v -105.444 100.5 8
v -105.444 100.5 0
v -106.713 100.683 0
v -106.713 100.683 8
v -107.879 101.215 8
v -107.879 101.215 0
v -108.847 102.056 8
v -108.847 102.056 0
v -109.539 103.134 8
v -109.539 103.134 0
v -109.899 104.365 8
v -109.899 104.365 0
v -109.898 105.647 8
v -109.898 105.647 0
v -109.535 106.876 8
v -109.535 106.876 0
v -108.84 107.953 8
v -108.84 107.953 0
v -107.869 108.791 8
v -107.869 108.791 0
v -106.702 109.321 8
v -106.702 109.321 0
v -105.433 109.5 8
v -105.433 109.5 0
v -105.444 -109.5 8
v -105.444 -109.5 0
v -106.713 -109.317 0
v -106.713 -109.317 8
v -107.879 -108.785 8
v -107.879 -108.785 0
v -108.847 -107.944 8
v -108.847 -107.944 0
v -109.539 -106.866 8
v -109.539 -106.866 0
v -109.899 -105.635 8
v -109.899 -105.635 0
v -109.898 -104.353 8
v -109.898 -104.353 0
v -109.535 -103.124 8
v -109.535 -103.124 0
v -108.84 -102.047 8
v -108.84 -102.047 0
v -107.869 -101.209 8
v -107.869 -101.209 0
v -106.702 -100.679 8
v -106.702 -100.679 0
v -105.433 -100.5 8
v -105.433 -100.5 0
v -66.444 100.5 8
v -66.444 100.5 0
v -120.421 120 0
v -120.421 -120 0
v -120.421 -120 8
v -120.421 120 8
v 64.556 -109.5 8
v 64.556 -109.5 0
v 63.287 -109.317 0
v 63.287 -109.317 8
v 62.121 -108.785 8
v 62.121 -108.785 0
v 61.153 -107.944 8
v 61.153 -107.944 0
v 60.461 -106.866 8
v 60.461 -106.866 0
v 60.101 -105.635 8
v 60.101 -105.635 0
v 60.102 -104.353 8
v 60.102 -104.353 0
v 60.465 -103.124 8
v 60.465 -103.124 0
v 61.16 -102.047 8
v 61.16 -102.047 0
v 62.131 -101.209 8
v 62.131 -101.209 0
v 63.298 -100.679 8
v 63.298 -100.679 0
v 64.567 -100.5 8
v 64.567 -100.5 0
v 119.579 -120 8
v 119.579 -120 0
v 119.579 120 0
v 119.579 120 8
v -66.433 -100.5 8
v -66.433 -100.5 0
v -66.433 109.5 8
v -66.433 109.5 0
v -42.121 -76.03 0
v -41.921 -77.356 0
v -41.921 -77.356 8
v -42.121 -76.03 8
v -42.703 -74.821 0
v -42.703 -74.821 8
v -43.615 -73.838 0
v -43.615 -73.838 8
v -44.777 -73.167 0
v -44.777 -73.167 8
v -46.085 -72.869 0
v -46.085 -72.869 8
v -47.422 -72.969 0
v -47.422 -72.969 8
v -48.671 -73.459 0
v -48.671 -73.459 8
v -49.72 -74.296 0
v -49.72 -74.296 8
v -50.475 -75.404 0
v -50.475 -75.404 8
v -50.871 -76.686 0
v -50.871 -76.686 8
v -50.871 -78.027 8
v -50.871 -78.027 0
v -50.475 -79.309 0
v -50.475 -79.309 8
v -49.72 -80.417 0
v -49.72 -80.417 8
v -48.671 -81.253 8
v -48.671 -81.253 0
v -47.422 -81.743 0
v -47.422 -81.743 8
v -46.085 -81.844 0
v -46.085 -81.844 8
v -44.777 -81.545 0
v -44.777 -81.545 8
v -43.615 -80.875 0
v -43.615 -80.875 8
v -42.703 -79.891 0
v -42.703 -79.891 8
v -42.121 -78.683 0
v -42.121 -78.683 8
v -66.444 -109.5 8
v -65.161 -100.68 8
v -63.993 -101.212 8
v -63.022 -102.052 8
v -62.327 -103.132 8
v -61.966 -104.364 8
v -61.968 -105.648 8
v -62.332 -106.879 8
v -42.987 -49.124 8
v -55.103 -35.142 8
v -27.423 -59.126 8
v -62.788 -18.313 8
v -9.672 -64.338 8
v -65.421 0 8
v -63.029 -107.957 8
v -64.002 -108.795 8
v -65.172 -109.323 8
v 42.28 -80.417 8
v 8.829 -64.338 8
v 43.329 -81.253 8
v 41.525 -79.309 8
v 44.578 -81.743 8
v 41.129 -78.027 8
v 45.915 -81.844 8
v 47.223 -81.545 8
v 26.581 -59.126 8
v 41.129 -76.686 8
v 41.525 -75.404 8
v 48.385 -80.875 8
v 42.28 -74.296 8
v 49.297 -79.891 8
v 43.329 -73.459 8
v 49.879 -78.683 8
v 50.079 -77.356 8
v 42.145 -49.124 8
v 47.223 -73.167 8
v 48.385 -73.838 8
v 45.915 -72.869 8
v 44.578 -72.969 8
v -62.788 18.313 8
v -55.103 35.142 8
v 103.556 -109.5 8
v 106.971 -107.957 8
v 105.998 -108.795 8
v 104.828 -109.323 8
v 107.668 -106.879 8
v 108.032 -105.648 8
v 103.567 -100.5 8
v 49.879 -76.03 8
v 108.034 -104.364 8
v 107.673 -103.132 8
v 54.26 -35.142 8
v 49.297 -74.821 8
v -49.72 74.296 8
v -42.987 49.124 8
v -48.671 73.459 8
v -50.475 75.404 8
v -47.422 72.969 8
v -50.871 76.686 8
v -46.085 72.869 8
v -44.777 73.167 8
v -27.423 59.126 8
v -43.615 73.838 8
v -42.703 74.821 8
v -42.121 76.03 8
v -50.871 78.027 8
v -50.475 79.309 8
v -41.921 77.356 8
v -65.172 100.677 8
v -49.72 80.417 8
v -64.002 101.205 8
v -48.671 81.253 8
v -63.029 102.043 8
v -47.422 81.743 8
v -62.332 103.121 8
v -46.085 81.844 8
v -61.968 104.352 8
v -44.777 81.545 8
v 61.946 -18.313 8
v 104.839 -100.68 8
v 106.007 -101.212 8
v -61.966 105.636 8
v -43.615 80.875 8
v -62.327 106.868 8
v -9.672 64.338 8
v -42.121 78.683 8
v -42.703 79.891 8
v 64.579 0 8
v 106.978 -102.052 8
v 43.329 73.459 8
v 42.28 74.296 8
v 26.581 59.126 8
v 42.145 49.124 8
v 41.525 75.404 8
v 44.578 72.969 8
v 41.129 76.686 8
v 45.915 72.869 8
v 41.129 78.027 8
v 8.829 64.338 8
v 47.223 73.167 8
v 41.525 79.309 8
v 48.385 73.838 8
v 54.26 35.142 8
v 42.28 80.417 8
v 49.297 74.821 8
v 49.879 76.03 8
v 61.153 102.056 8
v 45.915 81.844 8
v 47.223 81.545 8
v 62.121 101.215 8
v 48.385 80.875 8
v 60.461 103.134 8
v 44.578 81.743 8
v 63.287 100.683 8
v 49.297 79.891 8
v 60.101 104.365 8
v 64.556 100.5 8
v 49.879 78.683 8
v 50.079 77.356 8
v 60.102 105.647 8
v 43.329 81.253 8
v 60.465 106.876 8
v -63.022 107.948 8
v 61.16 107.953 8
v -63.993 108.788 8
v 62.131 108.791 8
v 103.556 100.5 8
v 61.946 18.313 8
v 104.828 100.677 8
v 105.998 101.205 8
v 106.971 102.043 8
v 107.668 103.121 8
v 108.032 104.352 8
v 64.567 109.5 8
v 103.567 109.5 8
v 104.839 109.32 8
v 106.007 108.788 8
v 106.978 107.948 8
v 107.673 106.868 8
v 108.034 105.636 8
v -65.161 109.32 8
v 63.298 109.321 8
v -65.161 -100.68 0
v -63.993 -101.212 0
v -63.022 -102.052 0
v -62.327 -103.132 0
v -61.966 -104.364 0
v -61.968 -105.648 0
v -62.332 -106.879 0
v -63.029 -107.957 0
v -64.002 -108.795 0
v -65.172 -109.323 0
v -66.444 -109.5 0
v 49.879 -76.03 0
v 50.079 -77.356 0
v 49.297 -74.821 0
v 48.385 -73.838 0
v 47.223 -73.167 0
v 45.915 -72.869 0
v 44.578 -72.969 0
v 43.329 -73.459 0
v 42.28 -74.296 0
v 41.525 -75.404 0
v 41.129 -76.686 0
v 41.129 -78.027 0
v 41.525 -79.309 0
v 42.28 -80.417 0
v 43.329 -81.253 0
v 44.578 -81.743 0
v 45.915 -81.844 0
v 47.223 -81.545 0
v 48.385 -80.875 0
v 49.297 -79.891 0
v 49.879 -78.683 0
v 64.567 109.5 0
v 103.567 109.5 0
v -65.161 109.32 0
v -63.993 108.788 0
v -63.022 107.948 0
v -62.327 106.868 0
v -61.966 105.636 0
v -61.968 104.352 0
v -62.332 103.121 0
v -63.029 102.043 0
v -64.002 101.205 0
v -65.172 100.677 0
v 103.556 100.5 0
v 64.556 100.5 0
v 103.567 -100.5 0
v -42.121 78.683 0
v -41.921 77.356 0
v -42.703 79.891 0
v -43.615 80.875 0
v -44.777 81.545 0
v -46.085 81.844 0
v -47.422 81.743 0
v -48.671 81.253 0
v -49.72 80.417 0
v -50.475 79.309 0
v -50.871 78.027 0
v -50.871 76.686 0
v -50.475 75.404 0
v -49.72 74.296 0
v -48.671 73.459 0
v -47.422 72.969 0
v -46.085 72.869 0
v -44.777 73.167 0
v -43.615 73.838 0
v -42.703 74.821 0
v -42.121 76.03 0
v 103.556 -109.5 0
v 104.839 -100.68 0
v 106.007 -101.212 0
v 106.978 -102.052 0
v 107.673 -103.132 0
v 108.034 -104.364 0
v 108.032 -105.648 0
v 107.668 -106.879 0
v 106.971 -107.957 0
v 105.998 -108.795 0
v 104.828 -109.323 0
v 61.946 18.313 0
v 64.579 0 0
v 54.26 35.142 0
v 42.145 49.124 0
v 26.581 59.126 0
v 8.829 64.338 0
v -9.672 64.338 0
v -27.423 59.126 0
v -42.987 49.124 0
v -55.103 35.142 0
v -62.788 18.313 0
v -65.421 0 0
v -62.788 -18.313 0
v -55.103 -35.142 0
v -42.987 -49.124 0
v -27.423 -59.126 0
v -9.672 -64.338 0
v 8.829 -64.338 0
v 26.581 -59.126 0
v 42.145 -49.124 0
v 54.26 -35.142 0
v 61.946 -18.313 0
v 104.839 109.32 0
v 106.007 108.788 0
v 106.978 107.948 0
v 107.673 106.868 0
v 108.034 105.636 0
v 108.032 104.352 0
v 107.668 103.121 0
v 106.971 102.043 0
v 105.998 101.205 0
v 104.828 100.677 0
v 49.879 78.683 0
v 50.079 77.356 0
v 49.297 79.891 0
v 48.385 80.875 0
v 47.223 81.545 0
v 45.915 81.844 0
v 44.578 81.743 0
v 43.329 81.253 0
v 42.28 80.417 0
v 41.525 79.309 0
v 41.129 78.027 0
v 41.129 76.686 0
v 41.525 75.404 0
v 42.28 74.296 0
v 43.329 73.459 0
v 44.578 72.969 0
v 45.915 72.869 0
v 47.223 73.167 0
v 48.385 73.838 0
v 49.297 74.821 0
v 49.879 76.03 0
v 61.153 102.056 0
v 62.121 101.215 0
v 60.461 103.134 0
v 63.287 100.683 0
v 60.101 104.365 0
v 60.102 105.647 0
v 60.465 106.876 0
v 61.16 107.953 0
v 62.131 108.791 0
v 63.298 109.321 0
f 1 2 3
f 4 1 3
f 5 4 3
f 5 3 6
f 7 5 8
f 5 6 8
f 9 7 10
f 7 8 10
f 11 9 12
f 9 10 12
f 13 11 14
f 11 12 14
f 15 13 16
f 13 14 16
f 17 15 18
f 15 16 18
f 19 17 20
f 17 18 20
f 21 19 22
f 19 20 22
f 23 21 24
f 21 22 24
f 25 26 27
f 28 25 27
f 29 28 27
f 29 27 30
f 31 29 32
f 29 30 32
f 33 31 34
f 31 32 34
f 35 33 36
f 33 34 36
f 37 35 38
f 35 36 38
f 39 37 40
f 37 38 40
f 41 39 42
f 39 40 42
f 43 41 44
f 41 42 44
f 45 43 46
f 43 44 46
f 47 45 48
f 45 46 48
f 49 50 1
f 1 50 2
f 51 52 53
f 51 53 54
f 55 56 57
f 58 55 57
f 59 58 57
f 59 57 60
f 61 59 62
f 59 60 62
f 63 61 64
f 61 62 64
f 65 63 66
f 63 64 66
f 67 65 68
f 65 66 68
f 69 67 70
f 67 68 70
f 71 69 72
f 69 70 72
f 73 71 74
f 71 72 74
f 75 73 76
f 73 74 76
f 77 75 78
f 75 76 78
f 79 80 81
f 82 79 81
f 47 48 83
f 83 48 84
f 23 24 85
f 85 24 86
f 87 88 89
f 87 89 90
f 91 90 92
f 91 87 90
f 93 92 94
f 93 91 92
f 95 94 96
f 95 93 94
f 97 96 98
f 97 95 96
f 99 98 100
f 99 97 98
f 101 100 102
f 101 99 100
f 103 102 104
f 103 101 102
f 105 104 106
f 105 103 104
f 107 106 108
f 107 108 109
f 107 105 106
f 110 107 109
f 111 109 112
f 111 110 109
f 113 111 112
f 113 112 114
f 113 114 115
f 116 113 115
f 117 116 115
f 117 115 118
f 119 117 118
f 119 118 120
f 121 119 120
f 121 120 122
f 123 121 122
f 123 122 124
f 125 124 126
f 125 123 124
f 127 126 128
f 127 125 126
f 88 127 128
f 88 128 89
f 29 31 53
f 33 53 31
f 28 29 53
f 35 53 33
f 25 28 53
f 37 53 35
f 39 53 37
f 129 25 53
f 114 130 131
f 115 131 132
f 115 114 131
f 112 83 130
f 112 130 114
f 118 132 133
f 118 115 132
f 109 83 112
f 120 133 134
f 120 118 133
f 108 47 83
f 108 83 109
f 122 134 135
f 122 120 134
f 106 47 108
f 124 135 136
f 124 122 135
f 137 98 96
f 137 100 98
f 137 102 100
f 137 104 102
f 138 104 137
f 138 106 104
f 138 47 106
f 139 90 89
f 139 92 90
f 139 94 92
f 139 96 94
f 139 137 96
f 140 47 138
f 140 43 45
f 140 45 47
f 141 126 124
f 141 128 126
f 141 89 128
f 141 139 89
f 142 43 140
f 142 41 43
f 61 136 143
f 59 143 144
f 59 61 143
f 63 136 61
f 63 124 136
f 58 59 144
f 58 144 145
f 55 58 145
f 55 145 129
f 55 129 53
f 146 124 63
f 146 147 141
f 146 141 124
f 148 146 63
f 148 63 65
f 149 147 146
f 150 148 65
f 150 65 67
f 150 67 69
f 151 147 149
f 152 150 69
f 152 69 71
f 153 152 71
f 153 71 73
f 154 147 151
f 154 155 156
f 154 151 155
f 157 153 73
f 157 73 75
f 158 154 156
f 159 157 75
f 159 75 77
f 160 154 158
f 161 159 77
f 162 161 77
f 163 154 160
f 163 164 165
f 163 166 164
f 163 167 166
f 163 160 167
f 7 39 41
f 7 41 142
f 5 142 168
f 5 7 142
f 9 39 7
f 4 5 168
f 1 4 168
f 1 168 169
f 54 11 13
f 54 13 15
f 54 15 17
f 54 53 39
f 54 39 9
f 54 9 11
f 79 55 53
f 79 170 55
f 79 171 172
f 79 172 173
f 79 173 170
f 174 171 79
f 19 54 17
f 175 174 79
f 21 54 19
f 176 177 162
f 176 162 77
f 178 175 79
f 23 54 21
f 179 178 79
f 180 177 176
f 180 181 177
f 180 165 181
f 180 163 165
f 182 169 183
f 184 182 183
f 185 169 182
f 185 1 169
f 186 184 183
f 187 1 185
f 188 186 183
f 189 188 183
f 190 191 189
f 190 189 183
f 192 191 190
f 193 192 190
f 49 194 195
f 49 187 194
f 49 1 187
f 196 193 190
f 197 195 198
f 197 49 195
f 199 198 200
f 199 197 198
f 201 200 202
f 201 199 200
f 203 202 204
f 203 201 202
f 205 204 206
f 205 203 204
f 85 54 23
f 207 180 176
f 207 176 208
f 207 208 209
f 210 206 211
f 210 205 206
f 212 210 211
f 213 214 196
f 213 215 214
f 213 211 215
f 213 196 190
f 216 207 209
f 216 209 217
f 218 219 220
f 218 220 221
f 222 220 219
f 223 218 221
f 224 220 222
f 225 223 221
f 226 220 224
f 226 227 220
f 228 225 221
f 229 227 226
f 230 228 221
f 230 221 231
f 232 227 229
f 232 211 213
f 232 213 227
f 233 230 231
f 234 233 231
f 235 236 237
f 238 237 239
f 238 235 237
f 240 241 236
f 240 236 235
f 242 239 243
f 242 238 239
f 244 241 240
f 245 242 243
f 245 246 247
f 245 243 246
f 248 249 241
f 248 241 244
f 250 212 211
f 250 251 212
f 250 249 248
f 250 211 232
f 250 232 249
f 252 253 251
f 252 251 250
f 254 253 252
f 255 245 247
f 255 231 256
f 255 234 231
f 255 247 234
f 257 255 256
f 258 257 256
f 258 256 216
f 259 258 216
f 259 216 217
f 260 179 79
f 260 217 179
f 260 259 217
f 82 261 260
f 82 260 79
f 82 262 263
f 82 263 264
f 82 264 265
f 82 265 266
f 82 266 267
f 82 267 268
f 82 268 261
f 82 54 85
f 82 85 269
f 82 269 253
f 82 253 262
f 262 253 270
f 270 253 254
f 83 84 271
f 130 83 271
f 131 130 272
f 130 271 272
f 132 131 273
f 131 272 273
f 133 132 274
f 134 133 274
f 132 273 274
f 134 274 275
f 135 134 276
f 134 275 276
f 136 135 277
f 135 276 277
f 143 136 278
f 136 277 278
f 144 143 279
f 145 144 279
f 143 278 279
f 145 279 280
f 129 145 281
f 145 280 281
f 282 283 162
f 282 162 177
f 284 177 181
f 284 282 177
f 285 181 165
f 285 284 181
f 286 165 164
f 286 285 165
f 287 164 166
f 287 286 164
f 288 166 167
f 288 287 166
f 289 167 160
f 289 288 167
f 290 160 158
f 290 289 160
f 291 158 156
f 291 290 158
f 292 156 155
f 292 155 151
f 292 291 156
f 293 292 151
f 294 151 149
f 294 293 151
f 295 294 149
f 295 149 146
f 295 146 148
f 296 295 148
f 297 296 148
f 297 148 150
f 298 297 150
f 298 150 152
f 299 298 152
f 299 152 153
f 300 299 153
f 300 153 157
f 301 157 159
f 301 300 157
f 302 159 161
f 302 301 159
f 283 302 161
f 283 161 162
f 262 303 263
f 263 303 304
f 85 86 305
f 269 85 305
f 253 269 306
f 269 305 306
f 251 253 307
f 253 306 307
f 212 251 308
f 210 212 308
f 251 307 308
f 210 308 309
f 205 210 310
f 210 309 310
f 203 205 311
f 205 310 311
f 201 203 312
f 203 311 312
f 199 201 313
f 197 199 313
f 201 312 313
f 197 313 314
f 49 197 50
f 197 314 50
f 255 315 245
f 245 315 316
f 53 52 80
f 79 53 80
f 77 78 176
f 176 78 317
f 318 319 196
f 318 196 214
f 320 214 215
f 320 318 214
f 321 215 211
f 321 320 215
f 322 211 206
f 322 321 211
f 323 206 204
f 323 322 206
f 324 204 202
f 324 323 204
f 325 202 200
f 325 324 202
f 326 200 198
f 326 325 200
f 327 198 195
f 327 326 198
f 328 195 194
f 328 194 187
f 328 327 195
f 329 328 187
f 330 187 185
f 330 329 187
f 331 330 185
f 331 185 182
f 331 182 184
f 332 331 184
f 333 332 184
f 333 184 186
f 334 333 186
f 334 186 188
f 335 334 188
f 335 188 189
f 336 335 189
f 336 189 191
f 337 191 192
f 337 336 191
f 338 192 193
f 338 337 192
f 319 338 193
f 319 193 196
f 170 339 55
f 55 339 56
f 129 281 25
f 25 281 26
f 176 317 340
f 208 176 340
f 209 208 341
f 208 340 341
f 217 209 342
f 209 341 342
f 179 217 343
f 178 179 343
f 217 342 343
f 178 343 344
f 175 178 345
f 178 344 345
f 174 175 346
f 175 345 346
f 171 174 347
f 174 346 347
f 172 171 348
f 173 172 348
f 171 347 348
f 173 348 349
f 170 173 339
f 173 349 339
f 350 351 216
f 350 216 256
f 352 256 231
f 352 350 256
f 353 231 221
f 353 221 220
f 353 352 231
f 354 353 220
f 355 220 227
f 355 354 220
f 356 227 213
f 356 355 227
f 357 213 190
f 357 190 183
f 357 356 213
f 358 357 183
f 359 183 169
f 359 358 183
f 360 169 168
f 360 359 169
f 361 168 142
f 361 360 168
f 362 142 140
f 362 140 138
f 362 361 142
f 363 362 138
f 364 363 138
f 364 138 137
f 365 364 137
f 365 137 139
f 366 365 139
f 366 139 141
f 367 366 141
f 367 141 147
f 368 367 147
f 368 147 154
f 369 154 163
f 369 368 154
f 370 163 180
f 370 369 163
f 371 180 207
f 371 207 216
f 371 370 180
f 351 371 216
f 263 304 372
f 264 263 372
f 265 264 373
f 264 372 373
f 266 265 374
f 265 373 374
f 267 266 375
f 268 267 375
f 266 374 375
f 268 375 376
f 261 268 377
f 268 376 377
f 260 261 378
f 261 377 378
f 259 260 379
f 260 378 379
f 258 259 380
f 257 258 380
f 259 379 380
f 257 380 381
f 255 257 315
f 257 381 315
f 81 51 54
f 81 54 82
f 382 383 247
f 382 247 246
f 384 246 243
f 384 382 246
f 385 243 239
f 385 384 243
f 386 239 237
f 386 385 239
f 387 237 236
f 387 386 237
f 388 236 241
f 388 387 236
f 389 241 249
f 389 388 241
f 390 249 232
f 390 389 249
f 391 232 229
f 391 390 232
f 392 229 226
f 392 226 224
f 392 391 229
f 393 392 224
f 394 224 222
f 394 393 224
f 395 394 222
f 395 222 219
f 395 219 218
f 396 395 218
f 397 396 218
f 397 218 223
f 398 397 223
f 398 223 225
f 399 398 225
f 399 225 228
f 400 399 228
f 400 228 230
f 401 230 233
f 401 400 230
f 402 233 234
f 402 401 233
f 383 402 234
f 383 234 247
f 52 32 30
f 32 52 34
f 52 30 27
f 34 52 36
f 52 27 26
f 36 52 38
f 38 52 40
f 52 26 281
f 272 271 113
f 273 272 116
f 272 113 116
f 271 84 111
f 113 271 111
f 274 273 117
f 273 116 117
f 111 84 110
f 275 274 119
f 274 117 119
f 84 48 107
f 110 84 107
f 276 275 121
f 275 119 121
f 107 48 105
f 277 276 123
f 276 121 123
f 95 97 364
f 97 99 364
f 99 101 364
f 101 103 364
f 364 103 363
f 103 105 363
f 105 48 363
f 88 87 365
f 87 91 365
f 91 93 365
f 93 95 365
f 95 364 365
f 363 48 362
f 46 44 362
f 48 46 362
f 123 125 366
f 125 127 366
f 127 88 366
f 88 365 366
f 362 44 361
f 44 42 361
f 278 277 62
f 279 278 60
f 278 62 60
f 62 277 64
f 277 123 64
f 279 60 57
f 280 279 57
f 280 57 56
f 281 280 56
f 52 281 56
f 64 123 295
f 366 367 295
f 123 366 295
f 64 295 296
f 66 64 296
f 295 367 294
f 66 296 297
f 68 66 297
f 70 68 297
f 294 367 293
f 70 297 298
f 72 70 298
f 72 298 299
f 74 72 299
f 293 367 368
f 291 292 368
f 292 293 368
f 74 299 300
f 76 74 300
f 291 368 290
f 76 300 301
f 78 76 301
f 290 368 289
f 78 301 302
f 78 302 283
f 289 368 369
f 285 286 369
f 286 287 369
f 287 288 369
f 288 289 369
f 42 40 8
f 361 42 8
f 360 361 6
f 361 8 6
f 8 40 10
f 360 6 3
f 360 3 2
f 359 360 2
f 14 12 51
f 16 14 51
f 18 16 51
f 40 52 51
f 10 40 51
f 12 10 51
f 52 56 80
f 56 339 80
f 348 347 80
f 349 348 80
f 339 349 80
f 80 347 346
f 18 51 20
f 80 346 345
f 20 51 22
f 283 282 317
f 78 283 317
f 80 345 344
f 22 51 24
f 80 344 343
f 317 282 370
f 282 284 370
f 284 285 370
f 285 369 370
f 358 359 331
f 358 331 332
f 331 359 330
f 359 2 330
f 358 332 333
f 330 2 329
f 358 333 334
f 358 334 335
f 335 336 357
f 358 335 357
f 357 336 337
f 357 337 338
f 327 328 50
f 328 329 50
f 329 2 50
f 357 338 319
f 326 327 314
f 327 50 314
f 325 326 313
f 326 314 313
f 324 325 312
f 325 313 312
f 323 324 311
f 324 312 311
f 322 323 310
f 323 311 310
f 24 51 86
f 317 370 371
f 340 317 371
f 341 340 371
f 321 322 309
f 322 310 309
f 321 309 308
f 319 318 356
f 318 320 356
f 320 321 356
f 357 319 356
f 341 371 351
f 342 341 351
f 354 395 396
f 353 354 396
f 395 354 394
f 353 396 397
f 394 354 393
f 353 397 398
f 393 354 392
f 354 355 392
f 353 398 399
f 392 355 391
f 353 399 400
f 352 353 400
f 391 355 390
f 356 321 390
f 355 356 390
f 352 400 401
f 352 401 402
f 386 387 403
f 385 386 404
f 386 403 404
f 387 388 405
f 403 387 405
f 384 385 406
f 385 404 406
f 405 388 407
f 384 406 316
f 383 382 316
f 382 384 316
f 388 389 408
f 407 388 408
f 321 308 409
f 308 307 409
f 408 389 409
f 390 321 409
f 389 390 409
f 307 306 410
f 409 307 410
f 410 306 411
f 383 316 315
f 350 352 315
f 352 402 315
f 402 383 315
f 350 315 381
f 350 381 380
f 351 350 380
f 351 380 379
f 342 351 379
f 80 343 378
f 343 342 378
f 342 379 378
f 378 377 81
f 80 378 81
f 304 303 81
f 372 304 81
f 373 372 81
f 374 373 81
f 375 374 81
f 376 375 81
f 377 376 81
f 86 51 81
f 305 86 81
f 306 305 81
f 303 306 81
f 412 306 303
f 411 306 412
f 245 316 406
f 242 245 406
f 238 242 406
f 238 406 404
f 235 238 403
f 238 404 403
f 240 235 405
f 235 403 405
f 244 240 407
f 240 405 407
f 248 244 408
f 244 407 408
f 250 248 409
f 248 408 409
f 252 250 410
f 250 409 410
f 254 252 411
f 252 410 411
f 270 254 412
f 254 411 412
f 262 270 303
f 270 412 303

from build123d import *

# Parameters (mm, degrees)
F0_W     = 240
F0_H     = 240
F0_R     = 4.5
F0_R_2   = 65
F1_DEPTH = 8


with BuildPart() as f1:
    # F0 (on Top) → F1 (new body)
    with BuildSketch(Plane.XY):
        with Locations((-0.42114, 0)):
            Rectangle(F0_W, F0_H)
        with BuildLine():
            ThreePointArc((-105.444208, -109.5), (-109.944211, -104.994235), (-105.432677, -100.500015))
            Line((-105.432677, -100.500015), (-66.432677, -100.500015))
            ThreePointArc((-66.432677, -100.500015), (-61.921144, -105.005765), (-66.444208, -109.499941))
            Line((-66.444208, -109.499941), (-105.444208, -109.5))
        make_face(mode=Mode.SUBTRACT)
        with Locations((-46.42114, -77.356318)):
            Circle(F0_R, mode=Mode.SUBTRACT)
        with Locations((45.57886, -77.356318)):
            Circle(F0_R, mode=Mode.SUBTRACT)
        with BuildLine():
            ThreePointArc((64.555792, -109.5), (60.055789, -104.994235), (64.567323, -100.500015))
            Line((64.567323, -100.500015), (103.567323, -100.500015))
            ThreePointArc((103.567323, -100.500015), (108.078856, -105.005765), (103.555792, -109.499941))
            Line((103.555792, -109.499941), (64.555792, -109.5))
        make_face(mode=Mode.SUBTRACT)
        with BuildLine():
            ThreePointArc((-105.444208, 100.5), (-109.944211, 105.005765), (-105.432677, 109.499985))
            Line((-105.432677, 109.499985), (-66.432677, 109.499985))
            ThreePointArc((-66.432677, 109.499985), (-61.921144, 104.994235), (-66.444208, 100.500059))
            Line((-66.444208, 100.500059), (-105.444208, 100.5))
        make_face(mode=Mode.SUBTRACT)
        with Locations((-46.42114, 77.356318)):
            Circle(F0_R, mode=Mode.SUBTRACT)
        with Locations((-0.42114, 0)):
            Circle(F0_R_2, mode=Mode.SUBTRACT)
        with Locations((45.57886, 77.356318)):
            Circle(F0_R, mode=Mode.SUBTRACT)
        with BuildLine():
            ThreePointArc((64.555792, 100.5), (60.055789, 105.005765), (64.567323, 109.499985))
            Line((64.567323, 109.499985), (103.567323, 109.499985))
            ThreePointArc((103.567323, 109.499985), (108.078856, 104.994235), (103.555792, 100.500059))
            Line((103.555792, 100.500059), (64.555792, 100.5))
        make_face(mode=Mode.SUBTRACT)
    extrude(amount=F1_DEPTH)


solid = f1.part
